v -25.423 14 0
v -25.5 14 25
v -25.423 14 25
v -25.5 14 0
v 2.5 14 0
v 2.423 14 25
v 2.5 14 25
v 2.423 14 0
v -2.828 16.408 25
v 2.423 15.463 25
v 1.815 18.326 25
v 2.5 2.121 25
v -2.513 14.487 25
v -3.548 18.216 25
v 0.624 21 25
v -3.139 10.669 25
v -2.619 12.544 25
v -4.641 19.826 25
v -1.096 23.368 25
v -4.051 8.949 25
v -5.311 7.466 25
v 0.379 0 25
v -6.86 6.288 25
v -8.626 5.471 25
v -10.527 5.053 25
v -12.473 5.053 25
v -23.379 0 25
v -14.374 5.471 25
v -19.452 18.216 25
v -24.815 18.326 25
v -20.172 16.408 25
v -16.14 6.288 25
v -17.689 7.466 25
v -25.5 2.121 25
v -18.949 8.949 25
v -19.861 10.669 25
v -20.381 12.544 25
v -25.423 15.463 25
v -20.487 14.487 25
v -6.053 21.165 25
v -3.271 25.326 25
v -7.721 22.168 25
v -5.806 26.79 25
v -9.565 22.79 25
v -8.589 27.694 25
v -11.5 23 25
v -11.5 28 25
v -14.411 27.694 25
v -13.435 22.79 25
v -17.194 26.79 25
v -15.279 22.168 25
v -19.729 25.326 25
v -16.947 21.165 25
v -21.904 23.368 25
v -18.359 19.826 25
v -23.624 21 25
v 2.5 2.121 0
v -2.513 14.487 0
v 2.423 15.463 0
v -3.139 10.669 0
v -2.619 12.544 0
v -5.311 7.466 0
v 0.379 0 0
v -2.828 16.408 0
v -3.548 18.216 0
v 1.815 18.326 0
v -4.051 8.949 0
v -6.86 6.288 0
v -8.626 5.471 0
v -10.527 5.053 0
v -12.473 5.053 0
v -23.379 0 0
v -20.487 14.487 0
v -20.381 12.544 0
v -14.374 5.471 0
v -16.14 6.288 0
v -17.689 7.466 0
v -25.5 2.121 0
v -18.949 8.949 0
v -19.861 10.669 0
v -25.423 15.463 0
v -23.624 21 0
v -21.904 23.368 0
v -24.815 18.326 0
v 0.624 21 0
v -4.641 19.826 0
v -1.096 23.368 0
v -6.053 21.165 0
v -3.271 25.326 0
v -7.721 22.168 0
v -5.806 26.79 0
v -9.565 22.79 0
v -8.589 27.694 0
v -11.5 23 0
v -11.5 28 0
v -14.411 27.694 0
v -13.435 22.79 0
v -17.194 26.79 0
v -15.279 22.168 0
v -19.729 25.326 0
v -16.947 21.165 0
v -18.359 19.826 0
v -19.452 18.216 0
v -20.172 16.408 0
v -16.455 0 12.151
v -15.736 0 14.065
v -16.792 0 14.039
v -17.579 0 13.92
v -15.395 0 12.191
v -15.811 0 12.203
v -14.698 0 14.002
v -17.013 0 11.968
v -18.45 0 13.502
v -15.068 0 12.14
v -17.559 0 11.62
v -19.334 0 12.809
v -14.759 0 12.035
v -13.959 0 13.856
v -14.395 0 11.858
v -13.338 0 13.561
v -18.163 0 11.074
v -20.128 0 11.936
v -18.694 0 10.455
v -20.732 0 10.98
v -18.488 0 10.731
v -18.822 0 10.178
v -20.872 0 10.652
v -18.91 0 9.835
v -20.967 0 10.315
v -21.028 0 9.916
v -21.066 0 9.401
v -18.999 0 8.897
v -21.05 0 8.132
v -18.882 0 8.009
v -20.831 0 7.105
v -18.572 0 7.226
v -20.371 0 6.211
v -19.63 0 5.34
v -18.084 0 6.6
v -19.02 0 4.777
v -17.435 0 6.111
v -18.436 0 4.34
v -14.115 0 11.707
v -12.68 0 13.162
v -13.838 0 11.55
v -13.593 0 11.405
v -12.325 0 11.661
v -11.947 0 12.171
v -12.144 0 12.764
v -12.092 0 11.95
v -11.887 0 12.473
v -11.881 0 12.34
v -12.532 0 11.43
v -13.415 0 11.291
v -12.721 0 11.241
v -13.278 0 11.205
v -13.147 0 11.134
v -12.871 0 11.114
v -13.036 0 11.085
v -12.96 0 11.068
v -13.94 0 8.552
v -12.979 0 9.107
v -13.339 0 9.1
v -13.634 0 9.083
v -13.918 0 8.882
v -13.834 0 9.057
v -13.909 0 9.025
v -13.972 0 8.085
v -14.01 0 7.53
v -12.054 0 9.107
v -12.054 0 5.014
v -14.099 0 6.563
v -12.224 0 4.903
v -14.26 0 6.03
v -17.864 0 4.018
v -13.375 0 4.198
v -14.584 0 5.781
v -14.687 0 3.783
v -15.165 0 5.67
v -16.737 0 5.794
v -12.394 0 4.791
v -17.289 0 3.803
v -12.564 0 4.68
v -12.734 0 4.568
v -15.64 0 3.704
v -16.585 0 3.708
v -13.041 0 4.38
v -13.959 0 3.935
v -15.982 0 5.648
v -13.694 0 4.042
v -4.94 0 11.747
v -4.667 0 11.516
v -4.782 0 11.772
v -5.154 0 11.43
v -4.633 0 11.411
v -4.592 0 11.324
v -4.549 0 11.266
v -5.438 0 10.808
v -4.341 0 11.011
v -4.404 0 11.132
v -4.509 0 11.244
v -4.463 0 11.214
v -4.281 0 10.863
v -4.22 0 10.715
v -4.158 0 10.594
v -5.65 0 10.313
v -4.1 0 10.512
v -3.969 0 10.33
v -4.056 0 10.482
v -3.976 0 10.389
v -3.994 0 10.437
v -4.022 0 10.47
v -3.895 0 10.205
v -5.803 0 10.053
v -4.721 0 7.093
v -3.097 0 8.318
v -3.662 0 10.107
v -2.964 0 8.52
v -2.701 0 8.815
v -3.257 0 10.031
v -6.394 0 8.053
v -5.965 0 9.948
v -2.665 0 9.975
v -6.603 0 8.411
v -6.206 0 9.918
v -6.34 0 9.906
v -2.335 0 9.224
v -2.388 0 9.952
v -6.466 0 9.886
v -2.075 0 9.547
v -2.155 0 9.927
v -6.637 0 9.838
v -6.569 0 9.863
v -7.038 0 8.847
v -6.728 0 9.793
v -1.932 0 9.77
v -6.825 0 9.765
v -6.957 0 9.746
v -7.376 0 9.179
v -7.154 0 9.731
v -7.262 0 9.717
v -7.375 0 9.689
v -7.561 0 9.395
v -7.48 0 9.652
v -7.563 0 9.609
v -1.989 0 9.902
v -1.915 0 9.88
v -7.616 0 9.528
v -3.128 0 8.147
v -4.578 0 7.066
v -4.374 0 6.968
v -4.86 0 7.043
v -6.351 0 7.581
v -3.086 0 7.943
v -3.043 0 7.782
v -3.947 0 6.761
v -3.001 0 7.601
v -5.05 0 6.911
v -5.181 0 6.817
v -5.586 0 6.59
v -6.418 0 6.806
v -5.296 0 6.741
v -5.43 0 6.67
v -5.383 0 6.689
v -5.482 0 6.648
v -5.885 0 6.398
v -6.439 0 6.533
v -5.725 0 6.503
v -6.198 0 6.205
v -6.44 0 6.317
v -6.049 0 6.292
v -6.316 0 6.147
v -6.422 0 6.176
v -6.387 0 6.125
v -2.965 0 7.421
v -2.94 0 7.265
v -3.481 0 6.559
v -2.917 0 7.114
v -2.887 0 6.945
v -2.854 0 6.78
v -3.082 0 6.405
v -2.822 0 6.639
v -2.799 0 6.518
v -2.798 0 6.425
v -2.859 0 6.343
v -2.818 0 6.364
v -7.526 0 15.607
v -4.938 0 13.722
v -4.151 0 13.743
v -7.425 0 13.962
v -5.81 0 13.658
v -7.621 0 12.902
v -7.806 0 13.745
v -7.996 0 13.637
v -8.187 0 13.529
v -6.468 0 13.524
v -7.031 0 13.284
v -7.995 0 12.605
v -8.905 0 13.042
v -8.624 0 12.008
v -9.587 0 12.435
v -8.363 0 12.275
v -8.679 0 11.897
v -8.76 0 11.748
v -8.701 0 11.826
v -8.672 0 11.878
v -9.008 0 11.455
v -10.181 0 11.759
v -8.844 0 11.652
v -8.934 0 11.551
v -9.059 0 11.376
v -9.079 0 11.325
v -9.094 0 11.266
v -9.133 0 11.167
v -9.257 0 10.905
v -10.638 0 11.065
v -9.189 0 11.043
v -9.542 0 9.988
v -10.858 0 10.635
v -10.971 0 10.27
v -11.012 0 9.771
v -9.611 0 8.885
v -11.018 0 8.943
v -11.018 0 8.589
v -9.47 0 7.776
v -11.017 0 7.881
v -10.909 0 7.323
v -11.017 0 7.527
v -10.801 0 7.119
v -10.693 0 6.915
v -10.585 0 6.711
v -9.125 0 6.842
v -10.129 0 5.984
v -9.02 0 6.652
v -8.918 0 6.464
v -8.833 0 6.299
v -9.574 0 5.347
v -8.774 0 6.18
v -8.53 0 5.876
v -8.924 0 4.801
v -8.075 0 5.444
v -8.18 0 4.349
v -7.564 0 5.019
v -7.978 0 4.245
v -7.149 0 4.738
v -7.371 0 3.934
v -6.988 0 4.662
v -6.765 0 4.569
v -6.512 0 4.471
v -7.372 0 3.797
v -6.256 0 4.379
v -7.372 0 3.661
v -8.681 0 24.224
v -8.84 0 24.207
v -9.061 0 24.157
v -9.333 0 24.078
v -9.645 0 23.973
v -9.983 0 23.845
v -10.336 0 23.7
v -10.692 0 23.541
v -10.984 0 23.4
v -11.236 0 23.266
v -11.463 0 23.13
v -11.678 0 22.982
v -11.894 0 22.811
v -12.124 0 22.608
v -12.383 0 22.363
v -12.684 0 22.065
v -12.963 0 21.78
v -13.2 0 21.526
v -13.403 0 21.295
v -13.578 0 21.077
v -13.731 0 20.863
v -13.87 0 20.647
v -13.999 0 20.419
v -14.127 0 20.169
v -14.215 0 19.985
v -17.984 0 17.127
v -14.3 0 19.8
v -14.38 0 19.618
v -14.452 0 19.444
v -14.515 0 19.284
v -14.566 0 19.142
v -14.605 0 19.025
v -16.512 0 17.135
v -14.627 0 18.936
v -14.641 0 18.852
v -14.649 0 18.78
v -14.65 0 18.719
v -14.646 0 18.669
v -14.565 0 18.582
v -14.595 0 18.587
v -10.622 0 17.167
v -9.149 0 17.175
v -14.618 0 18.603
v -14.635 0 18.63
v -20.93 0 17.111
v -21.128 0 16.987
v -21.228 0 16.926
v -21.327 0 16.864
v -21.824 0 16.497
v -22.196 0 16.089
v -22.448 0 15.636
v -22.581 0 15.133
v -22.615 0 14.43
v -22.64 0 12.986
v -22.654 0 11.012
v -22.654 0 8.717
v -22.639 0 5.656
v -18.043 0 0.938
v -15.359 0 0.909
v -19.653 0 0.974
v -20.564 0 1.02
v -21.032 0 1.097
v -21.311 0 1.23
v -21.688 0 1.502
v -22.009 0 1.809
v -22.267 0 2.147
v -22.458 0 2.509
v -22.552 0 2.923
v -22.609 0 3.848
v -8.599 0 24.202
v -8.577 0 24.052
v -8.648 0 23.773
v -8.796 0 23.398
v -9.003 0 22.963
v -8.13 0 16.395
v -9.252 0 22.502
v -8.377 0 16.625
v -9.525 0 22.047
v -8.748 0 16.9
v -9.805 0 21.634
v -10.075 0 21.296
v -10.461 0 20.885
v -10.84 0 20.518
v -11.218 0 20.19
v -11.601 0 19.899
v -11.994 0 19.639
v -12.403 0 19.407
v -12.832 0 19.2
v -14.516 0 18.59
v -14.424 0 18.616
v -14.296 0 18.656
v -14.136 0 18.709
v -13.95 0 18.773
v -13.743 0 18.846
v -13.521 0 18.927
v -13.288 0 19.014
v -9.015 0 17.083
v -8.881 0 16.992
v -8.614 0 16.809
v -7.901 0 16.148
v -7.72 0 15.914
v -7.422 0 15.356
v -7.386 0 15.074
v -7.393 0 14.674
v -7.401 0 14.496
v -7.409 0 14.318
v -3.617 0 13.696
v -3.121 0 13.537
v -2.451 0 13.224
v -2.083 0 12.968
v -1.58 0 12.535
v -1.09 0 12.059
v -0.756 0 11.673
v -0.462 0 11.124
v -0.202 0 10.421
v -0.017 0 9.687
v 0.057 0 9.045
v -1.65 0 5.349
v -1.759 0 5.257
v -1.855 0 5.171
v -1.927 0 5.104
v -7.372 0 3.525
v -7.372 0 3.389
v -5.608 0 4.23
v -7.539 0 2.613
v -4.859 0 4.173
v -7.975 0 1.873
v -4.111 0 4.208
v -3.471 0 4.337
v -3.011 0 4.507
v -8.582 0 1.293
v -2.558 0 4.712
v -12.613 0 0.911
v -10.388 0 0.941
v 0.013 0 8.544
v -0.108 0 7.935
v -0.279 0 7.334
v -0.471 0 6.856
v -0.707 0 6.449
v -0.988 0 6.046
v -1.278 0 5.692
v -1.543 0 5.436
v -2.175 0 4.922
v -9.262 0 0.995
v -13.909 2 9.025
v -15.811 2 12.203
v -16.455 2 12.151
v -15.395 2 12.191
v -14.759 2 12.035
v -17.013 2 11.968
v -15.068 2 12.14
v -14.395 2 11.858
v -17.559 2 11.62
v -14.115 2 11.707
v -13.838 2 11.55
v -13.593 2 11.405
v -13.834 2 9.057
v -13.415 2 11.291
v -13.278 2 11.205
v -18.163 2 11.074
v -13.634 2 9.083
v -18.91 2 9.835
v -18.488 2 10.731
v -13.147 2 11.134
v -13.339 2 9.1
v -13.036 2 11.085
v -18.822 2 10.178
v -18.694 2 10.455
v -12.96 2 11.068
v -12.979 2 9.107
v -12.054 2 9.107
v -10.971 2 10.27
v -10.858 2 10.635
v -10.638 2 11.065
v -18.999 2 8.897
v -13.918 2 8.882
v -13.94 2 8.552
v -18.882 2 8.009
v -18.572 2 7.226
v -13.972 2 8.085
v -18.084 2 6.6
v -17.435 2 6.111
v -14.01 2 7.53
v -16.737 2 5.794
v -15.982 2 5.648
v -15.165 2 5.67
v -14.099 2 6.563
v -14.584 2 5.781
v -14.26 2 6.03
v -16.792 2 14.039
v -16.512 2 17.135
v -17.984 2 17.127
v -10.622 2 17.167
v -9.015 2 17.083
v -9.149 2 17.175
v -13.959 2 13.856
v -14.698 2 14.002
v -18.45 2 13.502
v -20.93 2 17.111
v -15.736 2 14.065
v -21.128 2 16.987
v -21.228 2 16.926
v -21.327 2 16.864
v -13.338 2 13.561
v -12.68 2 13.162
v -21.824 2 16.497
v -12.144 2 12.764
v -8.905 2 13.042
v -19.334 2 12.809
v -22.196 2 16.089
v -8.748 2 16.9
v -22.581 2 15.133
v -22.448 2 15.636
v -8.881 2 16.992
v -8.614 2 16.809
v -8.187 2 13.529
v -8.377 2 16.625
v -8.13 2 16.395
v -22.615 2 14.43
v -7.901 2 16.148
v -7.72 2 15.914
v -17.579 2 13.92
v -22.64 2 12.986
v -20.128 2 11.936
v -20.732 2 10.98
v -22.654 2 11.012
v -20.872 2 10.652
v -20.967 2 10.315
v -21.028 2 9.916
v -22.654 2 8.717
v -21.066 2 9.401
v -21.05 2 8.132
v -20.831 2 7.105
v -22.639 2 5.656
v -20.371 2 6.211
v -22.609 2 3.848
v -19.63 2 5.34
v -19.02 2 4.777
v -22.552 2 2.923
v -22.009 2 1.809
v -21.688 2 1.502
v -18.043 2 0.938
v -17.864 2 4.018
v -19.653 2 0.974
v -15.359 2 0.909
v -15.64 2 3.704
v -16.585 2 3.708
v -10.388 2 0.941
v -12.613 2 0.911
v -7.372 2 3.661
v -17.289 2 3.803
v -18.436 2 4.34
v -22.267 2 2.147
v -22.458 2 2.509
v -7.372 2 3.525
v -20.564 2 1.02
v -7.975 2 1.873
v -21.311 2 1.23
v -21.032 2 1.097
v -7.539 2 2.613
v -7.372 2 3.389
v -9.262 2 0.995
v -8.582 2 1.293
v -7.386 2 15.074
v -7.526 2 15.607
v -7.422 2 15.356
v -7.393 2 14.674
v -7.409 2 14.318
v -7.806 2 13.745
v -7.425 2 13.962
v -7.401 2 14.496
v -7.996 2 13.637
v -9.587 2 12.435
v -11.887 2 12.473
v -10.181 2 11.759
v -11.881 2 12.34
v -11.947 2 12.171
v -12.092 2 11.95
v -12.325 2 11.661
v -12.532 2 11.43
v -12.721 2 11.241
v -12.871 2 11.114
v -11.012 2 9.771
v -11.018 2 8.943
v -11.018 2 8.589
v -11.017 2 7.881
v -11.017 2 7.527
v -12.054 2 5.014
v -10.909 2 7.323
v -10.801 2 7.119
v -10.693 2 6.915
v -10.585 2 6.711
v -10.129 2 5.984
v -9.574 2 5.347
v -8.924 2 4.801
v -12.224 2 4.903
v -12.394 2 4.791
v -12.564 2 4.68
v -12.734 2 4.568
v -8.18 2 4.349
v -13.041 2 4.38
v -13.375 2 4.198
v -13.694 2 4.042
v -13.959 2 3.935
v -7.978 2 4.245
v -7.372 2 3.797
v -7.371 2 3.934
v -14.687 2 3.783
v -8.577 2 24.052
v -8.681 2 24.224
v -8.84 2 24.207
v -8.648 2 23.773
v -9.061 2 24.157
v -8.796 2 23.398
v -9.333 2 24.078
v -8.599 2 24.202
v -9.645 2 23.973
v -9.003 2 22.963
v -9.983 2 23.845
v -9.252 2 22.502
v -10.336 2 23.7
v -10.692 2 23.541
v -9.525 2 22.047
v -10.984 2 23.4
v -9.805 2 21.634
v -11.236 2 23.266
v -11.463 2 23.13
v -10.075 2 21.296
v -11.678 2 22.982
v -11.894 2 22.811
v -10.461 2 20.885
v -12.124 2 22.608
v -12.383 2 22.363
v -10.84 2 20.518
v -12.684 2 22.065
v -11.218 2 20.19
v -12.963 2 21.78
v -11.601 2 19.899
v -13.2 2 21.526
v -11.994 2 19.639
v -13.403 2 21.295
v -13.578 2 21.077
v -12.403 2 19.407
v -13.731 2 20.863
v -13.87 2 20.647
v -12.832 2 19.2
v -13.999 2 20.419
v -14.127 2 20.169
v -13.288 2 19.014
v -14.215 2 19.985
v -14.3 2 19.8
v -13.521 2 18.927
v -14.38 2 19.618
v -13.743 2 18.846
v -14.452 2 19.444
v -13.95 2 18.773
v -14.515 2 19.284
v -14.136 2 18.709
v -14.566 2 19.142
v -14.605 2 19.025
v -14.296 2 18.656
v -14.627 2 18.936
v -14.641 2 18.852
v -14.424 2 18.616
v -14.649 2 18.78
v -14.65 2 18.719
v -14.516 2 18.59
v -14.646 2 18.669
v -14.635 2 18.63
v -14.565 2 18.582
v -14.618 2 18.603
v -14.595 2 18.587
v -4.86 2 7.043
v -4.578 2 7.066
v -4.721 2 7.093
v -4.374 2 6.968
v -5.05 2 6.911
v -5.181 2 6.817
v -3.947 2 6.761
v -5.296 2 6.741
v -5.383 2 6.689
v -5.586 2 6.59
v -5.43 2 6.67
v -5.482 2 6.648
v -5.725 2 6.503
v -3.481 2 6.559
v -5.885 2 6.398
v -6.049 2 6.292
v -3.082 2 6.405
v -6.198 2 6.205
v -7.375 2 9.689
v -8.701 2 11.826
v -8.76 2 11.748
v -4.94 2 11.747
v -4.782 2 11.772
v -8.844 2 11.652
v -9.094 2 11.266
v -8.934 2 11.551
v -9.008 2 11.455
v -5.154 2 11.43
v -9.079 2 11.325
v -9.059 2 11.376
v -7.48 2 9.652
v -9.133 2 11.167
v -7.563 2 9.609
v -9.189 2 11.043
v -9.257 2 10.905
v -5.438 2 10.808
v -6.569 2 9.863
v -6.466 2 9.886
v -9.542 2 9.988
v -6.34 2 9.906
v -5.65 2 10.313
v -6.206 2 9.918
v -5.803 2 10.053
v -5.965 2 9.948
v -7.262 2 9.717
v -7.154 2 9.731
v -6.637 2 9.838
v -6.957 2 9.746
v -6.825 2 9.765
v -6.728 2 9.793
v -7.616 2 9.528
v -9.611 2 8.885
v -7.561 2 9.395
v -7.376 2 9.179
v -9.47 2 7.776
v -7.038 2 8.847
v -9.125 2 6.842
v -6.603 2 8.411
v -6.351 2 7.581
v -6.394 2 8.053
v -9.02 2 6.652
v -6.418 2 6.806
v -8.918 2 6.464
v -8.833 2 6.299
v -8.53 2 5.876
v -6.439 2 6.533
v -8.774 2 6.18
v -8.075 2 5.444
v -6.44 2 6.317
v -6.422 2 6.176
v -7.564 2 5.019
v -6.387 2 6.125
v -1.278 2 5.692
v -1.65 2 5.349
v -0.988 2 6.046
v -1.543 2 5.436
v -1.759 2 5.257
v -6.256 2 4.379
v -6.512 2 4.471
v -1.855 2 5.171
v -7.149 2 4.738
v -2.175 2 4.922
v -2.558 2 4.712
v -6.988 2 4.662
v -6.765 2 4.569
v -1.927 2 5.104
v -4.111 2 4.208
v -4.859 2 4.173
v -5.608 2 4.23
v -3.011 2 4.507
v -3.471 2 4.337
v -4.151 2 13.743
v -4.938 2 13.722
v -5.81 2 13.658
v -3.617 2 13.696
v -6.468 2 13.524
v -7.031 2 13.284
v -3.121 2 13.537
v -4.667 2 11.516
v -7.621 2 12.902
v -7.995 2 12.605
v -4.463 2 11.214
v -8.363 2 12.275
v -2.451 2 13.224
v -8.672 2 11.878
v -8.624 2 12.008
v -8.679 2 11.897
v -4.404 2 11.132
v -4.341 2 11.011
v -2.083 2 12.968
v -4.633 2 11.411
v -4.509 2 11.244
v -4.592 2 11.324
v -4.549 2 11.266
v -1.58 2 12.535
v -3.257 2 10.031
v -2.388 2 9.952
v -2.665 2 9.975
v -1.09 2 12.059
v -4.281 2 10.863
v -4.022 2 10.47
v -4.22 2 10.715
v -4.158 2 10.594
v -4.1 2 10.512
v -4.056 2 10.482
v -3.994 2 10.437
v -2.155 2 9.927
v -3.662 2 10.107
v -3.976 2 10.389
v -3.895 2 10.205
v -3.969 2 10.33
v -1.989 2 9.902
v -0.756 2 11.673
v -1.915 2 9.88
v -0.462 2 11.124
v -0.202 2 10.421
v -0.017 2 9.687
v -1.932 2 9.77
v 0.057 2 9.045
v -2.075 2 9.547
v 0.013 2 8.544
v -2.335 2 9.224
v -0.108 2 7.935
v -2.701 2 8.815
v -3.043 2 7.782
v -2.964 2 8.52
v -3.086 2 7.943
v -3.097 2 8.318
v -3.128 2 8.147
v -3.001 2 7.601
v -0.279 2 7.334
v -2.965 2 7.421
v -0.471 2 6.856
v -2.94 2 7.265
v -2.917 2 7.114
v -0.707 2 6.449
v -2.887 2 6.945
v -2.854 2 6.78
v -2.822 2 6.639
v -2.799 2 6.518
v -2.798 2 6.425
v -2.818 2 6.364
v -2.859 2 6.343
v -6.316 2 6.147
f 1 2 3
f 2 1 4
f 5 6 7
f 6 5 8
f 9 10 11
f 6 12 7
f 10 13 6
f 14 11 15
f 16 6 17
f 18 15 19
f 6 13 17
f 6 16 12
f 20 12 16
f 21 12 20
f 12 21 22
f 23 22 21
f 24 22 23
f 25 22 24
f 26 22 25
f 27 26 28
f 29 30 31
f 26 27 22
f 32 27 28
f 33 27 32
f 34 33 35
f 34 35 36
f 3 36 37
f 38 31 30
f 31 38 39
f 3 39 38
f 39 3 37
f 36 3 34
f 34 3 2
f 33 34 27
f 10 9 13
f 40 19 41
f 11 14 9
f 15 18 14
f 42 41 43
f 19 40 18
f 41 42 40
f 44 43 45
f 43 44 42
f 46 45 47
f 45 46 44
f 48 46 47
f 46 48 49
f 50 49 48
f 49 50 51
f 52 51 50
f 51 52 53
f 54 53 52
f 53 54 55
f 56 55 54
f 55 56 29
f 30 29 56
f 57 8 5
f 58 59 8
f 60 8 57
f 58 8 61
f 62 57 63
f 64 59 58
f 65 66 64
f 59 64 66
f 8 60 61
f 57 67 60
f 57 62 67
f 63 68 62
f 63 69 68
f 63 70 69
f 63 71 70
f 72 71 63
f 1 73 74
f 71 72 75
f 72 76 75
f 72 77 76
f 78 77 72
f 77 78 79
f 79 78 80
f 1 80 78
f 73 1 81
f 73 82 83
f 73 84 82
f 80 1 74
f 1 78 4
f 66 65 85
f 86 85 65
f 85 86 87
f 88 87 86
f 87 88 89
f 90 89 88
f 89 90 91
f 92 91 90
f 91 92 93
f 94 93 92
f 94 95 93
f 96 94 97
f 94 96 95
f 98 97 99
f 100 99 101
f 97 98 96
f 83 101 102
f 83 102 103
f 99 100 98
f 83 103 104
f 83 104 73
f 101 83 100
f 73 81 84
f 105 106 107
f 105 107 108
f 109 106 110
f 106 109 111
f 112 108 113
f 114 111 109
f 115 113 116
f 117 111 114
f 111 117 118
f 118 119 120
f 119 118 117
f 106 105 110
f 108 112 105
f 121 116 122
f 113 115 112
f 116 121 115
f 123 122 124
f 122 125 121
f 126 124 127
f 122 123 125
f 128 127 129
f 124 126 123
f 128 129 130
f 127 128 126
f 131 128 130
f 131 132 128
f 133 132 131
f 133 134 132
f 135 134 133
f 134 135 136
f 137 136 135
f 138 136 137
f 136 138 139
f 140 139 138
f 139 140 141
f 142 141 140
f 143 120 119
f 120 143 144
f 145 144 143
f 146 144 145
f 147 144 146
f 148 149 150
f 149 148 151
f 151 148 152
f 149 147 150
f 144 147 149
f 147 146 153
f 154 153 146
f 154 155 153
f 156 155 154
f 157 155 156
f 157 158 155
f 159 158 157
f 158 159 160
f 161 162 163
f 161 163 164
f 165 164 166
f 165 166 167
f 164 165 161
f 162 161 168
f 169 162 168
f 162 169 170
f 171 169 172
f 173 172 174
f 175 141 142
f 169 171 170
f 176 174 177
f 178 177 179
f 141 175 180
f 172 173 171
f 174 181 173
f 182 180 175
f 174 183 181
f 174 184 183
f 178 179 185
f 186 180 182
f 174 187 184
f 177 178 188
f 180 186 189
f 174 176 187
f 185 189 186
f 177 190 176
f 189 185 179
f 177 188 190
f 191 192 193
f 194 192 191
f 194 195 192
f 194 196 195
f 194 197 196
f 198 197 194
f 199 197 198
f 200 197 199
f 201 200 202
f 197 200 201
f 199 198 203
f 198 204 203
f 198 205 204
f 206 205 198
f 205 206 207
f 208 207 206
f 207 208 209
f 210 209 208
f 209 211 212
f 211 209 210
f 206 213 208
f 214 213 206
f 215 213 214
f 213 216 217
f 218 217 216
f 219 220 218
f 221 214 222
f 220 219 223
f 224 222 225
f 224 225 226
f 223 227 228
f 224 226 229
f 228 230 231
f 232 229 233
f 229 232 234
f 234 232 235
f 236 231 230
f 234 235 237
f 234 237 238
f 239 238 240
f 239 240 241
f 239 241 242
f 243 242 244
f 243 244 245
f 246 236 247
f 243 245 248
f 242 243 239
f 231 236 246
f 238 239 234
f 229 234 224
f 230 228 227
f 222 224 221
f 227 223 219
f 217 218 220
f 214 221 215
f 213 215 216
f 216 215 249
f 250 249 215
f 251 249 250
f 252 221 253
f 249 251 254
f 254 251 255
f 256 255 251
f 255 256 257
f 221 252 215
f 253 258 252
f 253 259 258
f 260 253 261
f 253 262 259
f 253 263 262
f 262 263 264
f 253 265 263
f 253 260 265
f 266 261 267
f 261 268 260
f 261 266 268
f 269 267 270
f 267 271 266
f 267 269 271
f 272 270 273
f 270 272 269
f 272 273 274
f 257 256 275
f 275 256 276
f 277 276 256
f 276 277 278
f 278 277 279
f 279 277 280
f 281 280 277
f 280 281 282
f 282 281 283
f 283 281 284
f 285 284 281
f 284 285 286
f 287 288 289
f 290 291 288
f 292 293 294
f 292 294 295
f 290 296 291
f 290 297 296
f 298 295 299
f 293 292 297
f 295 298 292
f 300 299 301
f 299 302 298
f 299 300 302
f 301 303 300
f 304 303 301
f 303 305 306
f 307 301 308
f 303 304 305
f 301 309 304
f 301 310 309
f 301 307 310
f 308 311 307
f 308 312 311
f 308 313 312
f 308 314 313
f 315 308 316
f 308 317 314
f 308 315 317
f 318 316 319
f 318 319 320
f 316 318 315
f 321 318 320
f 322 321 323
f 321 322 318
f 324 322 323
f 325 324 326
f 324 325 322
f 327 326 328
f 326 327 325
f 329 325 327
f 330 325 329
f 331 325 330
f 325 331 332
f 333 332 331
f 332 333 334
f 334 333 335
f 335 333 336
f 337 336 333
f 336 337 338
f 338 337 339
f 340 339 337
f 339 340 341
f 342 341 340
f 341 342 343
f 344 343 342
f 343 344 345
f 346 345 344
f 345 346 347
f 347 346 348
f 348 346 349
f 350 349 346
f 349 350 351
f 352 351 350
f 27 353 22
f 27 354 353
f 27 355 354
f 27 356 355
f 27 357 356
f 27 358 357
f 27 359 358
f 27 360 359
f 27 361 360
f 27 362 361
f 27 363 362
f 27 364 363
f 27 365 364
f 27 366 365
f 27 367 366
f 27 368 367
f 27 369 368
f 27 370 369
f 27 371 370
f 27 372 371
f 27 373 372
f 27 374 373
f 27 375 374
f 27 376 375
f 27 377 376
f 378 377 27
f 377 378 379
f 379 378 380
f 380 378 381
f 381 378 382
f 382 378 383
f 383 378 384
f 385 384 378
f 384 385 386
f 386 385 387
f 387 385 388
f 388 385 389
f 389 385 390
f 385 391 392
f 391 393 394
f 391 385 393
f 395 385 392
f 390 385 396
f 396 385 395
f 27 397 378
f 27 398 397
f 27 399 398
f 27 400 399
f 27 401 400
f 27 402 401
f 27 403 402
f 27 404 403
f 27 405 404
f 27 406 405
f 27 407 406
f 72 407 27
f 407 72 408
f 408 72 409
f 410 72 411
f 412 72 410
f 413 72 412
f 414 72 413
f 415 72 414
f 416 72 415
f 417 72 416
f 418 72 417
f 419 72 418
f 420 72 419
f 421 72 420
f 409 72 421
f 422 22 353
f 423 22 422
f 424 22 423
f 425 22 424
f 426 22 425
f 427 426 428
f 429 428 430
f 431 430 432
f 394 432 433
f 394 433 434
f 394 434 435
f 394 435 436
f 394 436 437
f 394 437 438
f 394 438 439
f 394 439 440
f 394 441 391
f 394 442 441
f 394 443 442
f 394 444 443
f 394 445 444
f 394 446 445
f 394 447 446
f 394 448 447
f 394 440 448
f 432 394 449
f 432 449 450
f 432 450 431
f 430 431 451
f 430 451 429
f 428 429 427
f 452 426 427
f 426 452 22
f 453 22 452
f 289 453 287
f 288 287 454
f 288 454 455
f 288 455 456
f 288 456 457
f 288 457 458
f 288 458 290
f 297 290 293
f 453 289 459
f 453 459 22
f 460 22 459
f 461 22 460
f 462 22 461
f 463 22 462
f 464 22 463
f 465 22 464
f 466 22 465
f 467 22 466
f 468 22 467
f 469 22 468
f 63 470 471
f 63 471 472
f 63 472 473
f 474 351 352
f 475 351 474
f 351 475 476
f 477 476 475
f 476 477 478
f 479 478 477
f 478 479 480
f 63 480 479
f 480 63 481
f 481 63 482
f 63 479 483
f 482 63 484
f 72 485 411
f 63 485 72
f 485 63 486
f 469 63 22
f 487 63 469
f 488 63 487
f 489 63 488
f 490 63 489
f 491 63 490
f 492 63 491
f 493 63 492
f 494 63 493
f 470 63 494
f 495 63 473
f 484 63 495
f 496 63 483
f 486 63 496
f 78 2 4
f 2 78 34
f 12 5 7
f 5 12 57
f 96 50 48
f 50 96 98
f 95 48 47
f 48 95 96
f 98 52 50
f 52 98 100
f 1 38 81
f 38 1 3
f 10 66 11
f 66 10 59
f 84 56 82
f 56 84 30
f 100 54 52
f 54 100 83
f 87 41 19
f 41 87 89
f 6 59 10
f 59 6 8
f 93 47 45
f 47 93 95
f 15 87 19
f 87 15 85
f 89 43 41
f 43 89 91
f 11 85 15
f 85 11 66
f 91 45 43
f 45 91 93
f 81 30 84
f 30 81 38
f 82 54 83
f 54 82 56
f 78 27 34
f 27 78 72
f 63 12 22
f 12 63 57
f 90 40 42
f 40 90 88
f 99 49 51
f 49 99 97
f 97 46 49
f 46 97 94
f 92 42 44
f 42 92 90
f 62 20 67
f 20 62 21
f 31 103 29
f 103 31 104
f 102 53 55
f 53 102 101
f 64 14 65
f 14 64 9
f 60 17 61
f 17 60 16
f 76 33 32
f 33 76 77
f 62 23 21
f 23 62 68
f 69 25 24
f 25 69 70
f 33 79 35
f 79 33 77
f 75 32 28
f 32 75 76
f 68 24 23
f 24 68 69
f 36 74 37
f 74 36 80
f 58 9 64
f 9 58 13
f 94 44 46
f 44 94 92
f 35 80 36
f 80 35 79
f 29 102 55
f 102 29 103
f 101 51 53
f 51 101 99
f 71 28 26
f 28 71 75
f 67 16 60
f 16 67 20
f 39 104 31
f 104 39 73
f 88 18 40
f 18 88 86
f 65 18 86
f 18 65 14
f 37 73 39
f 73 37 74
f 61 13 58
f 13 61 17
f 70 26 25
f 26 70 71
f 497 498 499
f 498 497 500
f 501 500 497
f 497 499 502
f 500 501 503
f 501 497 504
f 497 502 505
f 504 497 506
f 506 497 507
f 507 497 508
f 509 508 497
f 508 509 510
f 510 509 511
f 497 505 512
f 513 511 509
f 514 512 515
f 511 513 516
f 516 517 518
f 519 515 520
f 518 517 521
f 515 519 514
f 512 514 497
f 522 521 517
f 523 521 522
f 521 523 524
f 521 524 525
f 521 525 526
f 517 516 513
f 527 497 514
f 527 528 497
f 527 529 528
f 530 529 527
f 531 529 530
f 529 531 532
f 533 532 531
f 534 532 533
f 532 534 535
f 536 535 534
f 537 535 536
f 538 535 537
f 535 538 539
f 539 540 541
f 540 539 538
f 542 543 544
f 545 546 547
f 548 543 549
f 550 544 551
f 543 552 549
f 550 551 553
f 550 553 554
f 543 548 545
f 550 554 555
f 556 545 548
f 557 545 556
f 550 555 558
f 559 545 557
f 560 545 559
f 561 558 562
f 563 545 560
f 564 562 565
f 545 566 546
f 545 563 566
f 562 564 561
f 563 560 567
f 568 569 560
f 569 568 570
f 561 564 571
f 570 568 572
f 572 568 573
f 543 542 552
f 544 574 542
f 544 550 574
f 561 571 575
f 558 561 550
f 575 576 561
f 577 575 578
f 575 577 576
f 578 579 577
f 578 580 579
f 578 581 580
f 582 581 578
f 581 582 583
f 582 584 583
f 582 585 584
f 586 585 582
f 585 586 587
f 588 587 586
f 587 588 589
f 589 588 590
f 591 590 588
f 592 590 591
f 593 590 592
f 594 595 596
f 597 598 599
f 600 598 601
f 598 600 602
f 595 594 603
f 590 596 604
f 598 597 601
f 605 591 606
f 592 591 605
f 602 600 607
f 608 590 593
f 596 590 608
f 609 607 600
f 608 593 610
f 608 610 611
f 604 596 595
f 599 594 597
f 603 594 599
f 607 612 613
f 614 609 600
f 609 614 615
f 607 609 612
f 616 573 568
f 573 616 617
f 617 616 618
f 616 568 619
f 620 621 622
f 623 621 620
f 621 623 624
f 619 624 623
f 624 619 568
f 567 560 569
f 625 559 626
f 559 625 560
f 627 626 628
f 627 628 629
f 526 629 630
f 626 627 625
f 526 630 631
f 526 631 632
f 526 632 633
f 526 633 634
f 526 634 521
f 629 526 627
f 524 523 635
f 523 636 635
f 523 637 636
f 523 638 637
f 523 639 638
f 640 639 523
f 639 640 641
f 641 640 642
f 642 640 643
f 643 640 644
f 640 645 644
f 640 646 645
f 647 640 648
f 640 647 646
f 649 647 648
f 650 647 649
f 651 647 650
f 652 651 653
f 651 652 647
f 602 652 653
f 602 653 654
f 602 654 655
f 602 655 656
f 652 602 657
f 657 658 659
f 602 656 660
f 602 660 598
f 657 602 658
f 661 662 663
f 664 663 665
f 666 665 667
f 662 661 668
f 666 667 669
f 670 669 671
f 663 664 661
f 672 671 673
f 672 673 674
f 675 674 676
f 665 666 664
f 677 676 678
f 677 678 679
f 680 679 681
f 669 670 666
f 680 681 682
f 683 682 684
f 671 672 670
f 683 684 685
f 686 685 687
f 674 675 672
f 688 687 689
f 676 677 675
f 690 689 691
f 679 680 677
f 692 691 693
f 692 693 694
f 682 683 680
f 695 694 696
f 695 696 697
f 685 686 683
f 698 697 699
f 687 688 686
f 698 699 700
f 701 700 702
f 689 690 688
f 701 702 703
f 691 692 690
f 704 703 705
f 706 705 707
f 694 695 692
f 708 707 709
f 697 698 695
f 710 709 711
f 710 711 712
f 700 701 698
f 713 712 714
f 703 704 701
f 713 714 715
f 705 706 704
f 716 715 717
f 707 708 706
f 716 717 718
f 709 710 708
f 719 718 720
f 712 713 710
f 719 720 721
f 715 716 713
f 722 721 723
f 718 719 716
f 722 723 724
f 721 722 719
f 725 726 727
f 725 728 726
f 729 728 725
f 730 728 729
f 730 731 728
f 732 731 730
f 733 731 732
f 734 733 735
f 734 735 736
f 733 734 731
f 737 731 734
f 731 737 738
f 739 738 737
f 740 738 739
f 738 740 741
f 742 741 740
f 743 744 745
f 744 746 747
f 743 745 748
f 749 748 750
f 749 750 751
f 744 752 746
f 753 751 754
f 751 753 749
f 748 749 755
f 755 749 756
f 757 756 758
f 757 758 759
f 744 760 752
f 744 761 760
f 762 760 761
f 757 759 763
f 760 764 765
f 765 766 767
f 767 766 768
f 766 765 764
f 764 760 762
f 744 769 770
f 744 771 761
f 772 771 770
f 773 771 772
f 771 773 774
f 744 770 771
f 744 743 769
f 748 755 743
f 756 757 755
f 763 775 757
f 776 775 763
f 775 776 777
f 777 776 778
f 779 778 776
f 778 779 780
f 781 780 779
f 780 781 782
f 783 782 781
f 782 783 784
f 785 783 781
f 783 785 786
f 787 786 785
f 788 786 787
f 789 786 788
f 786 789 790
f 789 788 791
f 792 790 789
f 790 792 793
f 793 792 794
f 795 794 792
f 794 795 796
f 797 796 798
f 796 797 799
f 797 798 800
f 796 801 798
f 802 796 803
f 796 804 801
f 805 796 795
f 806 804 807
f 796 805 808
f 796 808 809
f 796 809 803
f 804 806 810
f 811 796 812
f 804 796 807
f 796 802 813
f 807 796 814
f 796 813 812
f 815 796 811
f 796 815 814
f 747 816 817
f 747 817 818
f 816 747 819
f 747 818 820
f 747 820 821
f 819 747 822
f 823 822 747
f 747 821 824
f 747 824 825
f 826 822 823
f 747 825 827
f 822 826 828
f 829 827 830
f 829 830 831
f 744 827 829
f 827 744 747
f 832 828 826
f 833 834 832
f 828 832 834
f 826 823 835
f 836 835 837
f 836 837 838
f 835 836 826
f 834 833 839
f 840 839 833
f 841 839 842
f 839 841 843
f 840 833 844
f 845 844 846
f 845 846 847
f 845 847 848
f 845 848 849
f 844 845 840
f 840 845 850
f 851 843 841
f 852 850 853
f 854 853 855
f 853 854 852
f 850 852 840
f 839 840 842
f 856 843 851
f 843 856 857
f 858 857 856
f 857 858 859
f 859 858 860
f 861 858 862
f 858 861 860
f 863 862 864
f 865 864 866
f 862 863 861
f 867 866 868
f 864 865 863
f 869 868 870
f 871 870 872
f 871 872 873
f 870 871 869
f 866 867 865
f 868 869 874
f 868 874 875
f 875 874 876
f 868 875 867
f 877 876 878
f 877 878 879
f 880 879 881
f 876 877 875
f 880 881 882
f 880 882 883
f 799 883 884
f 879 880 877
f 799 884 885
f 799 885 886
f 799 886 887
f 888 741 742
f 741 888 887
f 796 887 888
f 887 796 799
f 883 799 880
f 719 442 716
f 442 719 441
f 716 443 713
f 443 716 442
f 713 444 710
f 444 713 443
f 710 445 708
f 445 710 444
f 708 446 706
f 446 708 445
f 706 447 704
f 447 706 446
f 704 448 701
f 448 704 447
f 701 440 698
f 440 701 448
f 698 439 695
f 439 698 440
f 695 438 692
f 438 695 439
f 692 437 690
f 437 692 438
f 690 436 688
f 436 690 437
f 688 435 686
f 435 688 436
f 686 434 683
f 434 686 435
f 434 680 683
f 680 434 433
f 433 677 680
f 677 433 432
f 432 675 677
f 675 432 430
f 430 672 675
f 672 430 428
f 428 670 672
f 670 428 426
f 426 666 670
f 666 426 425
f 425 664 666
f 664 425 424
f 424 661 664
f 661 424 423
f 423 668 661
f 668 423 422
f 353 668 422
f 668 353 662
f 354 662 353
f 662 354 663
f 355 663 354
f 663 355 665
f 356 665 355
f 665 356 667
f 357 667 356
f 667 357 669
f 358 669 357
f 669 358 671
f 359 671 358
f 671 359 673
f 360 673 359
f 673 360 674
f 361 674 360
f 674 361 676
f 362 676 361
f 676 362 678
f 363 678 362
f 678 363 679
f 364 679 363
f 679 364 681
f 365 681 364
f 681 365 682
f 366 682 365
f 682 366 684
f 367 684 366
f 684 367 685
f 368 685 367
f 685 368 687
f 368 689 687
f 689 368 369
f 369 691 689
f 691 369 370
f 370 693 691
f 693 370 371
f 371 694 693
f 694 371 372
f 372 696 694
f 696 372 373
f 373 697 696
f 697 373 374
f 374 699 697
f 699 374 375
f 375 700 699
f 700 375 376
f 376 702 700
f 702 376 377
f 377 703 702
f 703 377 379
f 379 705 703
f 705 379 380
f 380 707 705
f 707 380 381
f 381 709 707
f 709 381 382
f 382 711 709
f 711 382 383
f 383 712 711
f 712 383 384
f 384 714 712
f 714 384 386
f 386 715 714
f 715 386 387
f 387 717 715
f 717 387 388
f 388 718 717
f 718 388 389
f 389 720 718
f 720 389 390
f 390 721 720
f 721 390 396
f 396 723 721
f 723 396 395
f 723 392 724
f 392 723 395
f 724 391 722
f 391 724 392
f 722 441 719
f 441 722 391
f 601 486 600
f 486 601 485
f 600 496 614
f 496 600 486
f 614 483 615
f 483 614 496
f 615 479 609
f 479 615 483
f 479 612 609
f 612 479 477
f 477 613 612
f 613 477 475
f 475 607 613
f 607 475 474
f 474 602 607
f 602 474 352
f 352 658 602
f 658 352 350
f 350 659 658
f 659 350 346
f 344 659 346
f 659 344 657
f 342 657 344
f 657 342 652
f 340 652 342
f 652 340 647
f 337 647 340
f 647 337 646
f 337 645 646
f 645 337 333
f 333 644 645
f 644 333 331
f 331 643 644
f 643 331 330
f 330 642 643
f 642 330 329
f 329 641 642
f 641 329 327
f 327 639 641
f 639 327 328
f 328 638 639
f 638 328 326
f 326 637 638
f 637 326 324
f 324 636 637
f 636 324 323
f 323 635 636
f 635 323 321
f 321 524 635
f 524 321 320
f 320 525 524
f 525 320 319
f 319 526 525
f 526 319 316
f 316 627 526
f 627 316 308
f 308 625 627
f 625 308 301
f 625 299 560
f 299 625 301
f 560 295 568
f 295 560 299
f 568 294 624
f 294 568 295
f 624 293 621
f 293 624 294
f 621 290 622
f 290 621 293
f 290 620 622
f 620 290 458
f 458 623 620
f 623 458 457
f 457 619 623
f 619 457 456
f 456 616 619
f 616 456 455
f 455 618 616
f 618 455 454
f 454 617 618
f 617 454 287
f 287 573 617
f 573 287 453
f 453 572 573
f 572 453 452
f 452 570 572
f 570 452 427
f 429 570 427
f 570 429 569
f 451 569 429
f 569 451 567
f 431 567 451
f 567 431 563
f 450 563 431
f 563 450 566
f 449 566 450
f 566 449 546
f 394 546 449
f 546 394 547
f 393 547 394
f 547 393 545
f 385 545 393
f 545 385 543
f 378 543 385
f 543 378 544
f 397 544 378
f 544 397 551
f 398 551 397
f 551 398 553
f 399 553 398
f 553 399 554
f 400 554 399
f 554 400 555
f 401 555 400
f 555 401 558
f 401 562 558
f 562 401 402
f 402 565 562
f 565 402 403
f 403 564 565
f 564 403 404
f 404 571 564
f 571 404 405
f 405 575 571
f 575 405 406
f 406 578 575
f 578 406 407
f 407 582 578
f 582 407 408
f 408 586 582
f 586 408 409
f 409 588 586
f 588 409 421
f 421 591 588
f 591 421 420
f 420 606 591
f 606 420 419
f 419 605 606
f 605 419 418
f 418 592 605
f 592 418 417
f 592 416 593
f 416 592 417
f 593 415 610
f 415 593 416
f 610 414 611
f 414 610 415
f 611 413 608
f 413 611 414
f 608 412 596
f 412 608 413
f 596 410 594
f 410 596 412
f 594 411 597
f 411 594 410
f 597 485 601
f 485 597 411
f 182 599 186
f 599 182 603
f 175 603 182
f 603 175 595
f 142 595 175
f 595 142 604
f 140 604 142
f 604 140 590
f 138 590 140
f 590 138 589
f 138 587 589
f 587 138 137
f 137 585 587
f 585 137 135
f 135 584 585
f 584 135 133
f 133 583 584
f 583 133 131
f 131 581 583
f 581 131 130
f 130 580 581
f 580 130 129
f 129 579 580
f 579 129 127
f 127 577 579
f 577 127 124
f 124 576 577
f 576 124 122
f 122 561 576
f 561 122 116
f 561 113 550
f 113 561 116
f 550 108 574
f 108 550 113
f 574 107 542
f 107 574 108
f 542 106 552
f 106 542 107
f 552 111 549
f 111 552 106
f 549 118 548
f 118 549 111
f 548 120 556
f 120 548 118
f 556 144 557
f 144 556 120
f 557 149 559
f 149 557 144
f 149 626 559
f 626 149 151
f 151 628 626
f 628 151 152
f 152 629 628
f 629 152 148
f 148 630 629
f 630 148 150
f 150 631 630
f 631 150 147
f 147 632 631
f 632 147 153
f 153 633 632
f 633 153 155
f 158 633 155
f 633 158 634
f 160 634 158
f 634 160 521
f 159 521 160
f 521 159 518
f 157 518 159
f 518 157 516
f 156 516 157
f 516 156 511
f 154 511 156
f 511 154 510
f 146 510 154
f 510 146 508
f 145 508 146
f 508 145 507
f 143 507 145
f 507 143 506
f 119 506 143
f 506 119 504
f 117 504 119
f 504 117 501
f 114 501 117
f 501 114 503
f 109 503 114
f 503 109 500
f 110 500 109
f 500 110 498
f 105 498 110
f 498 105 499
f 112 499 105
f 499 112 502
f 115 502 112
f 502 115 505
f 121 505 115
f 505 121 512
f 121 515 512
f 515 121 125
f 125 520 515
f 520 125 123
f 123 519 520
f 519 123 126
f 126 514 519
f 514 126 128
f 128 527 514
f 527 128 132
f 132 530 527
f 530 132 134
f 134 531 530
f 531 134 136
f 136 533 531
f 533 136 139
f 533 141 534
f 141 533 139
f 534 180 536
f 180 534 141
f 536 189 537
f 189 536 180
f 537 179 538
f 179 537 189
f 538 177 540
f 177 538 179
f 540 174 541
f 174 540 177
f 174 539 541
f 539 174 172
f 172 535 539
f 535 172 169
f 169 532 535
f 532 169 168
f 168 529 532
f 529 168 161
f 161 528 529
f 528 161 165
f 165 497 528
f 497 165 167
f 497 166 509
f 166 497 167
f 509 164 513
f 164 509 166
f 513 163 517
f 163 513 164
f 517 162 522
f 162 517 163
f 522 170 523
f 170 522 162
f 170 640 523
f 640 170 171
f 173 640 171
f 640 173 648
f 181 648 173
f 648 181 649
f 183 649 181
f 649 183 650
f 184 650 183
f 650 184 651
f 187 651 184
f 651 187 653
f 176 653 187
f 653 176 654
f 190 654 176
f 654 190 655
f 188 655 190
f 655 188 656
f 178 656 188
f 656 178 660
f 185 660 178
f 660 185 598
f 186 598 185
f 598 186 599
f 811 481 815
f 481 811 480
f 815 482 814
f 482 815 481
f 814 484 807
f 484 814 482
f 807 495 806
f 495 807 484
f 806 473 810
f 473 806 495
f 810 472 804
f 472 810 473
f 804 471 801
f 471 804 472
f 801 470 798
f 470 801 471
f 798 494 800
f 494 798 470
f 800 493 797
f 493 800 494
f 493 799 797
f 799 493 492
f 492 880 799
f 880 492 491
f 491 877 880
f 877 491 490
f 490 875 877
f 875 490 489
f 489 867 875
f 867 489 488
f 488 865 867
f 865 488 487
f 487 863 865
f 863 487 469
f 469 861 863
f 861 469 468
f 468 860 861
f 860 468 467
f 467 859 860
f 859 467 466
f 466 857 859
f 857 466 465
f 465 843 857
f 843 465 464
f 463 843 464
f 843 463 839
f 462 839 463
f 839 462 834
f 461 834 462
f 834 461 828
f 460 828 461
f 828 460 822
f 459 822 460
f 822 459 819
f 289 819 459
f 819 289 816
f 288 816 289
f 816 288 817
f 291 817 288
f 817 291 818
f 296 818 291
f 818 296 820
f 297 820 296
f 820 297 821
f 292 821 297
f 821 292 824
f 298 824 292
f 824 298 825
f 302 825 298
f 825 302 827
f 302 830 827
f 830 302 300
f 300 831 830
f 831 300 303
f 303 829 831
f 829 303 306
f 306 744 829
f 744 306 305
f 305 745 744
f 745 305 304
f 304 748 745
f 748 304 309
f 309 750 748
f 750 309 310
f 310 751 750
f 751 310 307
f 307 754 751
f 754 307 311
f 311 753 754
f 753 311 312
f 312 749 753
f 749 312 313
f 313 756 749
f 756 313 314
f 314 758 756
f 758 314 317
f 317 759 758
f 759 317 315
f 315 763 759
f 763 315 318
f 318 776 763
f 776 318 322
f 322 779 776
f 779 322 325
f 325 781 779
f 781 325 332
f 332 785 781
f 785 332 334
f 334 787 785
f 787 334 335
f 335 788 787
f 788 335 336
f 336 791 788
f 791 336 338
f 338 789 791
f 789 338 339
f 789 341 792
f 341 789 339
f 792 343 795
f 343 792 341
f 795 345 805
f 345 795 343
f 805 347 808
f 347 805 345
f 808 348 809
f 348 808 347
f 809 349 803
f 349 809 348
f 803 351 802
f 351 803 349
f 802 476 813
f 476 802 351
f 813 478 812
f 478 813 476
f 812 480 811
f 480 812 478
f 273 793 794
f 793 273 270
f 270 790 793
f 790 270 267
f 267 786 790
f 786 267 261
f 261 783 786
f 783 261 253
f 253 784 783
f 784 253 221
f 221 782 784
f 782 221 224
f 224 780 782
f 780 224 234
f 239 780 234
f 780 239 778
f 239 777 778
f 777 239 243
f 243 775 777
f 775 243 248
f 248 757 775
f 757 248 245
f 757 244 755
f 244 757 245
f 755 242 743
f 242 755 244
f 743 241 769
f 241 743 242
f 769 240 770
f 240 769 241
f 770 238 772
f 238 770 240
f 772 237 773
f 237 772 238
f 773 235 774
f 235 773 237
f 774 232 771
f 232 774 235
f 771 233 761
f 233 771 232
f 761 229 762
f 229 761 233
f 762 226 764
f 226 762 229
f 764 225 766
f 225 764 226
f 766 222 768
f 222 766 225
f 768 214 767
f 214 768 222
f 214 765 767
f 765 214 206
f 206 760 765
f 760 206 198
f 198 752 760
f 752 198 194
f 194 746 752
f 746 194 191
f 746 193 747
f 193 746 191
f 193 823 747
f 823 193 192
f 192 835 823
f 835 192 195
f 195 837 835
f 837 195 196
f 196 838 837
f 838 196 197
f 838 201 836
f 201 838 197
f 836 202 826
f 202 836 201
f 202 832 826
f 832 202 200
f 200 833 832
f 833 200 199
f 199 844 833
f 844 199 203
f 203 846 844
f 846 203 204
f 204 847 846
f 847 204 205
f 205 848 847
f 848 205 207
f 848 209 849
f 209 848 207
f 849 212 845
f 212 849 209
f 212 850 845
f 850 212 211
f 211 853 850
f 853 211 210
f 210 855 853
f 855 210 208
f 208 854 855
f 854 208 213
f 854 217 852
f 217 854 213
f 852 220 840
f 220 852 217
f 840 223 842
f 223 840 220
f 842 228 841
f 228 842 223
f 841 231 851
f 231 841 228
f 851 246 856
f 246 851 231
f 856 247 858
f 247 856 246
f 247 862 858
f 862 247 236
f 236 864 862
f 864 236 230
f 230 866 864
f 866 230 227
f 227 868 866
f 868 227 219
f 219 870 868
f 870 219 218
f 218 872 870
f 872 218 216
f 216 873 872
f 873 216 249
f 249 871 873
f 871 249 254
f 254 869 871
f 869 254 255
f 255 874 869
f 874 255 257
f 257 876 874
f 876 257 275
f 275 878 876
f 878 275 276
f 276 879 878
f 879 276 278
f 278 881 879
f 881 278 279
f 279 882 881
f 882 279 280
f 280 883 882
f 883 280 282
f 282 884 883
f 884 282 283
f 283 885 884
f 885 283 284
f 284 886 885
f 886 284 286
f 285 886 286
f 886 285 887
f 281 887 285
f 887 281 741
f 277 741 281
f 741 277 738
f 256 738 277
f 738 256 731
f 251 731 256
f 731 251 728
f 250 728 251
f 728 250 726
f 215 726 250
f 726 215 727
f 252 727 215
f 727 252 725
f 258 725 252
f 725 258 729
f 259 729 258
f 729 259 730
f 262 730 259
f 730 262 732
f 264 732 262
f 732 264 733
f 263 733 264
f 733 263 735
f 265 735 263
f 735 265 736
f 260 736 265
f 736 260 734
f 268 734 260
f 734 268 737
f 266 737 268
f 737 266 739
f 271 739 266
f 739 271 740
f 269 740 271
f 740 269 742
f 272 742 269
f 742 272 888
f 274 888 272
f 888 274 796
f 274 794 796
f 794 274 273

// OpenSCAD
// Sized RepRap Power Ring
// By fillibar
// Description:
//   This ring is based on the parametric power ring. Rather than use specific values that
//   some may not know I used the "standard" ring sizes for most of the world. Enter the region
//   then the other parameters. The SizedPowerRing module will just call the normal PowerRing
//   module with the correct inner size.
//
// Based on:
//  Parametric RepRap Power Ring by Daniel Harmsworth (http://www.thingiverse.com/thing:3917)
//  RepRap Power Ring by Zack Hoeken (http://www.thingiverse.com/thing:48)
//  Ring sizes per Wikipedia (http://en.wikipedia.org/wiki/Ring_size)
//
// Licensed under the Creative Commons - GNU GPL, http://creativecommons.org/licenses/GPL/2.0/
//
// Parameters are as follows:
// 1) Sets ring sizing region. Values are:
//   0 for United States and Canada
//   1 for UK, Ireland, Australia & New Zealand (Please note: "" is needed around non-numerical values)
//   2 for India, China & Japan
//   3 for Switzerland
// 2) Sets internal ring size based on ring sizes for the region set in parameter 1.
// 3) Sets thickness of the ring (lengthways along the finger).
// 4) Sets depth of the RepRap logo embossed on the ring.
// 5) Sets whether the front edges are beveled or not.


PowerRing( 18, 25, 2, true );
 //Gumcam(15,3);
//TearDrop(15,3);


module PowerRing ( diameter, thick, depth, bevel )
{
  rotate( a = [ 0, 0, 90 ] )
  {
    difference()
    {
      union ()
      {
        translate ( v = [0,-2.5,0] )
        cube( [ ( diameter / 2 ) + 5, diameter + 10, thick], center = false );
        translate( v = [ ( diameter / 2 ) + 5, ( diameter / 2 ) + 2.5, ] )
        cylinder( h = thick, r = ( diameter / 2 ) + 5 );
      }
     translate( v = [(diameter / 2) + 5,(diameter / 2) + 2.5,-1 ] )
     cylinder(h=thick+2,r=diameter / 2);
    
	translate( v = [2,(diameter / 2) + 8,thick / 2-3.5] )
    rotate ( a = [90,0,180])  
	//TearDrop(thick / 3,depth + 1);
    Gumcam(thick / 3,depth + 1); 
	if (bevel)
      {
        /*translate ( v = [0,(diameter / 2)+2.5,0] )
        rotate ( a = [0,45,0])
        cube([3,diameter + 20,3],center = true);
        translate ( v = [0,(diameter / 2)+2.5,thick] )
        rotate ( a = [0,45,0])
        cube([3,diameter + 20,3],center = true);*/
        translate ( v = [0,diameter+7.5,(thick / 2)] )
        rotate ( a = [0,0,45]) 
        cube([3,3,thick + 10],center = true);
        translate ( v = [0,-2.5,(thick / 2)] )
        rotate ( a = [0,0,45])
        cube([3,3,thick + 10],center = true);
      }
    }
  }
}

module TearDrop(radius,depth)
{
  teardiff = (	sqrt(	( (radius * 2) * (radius * 2) ) * 2 ) - (radius * 2) ) / 2;
  translate(v = [depth/2,0,-teardiff / 2])
  rotate(a = [0,-90,0])
  union()
  {
    cylinder(h=depth,r=radius, center = true);
    intersection()
    {
      rotate(a = [0,0,45])
      cube([2*radius,2*radius,depth], center = true);
      translate([1.65*radius, 0, 0])
      cube([2*radius,2*radius,depth], center = true);
    }
  }
}

module Gumcam(radius,depth)
{
	scale([1,radius/28,radius/28])
	rotate(a = [0,90,0])
	linear_extrude(height = depth)
	import("GUMCAMv3.dxf");
}
